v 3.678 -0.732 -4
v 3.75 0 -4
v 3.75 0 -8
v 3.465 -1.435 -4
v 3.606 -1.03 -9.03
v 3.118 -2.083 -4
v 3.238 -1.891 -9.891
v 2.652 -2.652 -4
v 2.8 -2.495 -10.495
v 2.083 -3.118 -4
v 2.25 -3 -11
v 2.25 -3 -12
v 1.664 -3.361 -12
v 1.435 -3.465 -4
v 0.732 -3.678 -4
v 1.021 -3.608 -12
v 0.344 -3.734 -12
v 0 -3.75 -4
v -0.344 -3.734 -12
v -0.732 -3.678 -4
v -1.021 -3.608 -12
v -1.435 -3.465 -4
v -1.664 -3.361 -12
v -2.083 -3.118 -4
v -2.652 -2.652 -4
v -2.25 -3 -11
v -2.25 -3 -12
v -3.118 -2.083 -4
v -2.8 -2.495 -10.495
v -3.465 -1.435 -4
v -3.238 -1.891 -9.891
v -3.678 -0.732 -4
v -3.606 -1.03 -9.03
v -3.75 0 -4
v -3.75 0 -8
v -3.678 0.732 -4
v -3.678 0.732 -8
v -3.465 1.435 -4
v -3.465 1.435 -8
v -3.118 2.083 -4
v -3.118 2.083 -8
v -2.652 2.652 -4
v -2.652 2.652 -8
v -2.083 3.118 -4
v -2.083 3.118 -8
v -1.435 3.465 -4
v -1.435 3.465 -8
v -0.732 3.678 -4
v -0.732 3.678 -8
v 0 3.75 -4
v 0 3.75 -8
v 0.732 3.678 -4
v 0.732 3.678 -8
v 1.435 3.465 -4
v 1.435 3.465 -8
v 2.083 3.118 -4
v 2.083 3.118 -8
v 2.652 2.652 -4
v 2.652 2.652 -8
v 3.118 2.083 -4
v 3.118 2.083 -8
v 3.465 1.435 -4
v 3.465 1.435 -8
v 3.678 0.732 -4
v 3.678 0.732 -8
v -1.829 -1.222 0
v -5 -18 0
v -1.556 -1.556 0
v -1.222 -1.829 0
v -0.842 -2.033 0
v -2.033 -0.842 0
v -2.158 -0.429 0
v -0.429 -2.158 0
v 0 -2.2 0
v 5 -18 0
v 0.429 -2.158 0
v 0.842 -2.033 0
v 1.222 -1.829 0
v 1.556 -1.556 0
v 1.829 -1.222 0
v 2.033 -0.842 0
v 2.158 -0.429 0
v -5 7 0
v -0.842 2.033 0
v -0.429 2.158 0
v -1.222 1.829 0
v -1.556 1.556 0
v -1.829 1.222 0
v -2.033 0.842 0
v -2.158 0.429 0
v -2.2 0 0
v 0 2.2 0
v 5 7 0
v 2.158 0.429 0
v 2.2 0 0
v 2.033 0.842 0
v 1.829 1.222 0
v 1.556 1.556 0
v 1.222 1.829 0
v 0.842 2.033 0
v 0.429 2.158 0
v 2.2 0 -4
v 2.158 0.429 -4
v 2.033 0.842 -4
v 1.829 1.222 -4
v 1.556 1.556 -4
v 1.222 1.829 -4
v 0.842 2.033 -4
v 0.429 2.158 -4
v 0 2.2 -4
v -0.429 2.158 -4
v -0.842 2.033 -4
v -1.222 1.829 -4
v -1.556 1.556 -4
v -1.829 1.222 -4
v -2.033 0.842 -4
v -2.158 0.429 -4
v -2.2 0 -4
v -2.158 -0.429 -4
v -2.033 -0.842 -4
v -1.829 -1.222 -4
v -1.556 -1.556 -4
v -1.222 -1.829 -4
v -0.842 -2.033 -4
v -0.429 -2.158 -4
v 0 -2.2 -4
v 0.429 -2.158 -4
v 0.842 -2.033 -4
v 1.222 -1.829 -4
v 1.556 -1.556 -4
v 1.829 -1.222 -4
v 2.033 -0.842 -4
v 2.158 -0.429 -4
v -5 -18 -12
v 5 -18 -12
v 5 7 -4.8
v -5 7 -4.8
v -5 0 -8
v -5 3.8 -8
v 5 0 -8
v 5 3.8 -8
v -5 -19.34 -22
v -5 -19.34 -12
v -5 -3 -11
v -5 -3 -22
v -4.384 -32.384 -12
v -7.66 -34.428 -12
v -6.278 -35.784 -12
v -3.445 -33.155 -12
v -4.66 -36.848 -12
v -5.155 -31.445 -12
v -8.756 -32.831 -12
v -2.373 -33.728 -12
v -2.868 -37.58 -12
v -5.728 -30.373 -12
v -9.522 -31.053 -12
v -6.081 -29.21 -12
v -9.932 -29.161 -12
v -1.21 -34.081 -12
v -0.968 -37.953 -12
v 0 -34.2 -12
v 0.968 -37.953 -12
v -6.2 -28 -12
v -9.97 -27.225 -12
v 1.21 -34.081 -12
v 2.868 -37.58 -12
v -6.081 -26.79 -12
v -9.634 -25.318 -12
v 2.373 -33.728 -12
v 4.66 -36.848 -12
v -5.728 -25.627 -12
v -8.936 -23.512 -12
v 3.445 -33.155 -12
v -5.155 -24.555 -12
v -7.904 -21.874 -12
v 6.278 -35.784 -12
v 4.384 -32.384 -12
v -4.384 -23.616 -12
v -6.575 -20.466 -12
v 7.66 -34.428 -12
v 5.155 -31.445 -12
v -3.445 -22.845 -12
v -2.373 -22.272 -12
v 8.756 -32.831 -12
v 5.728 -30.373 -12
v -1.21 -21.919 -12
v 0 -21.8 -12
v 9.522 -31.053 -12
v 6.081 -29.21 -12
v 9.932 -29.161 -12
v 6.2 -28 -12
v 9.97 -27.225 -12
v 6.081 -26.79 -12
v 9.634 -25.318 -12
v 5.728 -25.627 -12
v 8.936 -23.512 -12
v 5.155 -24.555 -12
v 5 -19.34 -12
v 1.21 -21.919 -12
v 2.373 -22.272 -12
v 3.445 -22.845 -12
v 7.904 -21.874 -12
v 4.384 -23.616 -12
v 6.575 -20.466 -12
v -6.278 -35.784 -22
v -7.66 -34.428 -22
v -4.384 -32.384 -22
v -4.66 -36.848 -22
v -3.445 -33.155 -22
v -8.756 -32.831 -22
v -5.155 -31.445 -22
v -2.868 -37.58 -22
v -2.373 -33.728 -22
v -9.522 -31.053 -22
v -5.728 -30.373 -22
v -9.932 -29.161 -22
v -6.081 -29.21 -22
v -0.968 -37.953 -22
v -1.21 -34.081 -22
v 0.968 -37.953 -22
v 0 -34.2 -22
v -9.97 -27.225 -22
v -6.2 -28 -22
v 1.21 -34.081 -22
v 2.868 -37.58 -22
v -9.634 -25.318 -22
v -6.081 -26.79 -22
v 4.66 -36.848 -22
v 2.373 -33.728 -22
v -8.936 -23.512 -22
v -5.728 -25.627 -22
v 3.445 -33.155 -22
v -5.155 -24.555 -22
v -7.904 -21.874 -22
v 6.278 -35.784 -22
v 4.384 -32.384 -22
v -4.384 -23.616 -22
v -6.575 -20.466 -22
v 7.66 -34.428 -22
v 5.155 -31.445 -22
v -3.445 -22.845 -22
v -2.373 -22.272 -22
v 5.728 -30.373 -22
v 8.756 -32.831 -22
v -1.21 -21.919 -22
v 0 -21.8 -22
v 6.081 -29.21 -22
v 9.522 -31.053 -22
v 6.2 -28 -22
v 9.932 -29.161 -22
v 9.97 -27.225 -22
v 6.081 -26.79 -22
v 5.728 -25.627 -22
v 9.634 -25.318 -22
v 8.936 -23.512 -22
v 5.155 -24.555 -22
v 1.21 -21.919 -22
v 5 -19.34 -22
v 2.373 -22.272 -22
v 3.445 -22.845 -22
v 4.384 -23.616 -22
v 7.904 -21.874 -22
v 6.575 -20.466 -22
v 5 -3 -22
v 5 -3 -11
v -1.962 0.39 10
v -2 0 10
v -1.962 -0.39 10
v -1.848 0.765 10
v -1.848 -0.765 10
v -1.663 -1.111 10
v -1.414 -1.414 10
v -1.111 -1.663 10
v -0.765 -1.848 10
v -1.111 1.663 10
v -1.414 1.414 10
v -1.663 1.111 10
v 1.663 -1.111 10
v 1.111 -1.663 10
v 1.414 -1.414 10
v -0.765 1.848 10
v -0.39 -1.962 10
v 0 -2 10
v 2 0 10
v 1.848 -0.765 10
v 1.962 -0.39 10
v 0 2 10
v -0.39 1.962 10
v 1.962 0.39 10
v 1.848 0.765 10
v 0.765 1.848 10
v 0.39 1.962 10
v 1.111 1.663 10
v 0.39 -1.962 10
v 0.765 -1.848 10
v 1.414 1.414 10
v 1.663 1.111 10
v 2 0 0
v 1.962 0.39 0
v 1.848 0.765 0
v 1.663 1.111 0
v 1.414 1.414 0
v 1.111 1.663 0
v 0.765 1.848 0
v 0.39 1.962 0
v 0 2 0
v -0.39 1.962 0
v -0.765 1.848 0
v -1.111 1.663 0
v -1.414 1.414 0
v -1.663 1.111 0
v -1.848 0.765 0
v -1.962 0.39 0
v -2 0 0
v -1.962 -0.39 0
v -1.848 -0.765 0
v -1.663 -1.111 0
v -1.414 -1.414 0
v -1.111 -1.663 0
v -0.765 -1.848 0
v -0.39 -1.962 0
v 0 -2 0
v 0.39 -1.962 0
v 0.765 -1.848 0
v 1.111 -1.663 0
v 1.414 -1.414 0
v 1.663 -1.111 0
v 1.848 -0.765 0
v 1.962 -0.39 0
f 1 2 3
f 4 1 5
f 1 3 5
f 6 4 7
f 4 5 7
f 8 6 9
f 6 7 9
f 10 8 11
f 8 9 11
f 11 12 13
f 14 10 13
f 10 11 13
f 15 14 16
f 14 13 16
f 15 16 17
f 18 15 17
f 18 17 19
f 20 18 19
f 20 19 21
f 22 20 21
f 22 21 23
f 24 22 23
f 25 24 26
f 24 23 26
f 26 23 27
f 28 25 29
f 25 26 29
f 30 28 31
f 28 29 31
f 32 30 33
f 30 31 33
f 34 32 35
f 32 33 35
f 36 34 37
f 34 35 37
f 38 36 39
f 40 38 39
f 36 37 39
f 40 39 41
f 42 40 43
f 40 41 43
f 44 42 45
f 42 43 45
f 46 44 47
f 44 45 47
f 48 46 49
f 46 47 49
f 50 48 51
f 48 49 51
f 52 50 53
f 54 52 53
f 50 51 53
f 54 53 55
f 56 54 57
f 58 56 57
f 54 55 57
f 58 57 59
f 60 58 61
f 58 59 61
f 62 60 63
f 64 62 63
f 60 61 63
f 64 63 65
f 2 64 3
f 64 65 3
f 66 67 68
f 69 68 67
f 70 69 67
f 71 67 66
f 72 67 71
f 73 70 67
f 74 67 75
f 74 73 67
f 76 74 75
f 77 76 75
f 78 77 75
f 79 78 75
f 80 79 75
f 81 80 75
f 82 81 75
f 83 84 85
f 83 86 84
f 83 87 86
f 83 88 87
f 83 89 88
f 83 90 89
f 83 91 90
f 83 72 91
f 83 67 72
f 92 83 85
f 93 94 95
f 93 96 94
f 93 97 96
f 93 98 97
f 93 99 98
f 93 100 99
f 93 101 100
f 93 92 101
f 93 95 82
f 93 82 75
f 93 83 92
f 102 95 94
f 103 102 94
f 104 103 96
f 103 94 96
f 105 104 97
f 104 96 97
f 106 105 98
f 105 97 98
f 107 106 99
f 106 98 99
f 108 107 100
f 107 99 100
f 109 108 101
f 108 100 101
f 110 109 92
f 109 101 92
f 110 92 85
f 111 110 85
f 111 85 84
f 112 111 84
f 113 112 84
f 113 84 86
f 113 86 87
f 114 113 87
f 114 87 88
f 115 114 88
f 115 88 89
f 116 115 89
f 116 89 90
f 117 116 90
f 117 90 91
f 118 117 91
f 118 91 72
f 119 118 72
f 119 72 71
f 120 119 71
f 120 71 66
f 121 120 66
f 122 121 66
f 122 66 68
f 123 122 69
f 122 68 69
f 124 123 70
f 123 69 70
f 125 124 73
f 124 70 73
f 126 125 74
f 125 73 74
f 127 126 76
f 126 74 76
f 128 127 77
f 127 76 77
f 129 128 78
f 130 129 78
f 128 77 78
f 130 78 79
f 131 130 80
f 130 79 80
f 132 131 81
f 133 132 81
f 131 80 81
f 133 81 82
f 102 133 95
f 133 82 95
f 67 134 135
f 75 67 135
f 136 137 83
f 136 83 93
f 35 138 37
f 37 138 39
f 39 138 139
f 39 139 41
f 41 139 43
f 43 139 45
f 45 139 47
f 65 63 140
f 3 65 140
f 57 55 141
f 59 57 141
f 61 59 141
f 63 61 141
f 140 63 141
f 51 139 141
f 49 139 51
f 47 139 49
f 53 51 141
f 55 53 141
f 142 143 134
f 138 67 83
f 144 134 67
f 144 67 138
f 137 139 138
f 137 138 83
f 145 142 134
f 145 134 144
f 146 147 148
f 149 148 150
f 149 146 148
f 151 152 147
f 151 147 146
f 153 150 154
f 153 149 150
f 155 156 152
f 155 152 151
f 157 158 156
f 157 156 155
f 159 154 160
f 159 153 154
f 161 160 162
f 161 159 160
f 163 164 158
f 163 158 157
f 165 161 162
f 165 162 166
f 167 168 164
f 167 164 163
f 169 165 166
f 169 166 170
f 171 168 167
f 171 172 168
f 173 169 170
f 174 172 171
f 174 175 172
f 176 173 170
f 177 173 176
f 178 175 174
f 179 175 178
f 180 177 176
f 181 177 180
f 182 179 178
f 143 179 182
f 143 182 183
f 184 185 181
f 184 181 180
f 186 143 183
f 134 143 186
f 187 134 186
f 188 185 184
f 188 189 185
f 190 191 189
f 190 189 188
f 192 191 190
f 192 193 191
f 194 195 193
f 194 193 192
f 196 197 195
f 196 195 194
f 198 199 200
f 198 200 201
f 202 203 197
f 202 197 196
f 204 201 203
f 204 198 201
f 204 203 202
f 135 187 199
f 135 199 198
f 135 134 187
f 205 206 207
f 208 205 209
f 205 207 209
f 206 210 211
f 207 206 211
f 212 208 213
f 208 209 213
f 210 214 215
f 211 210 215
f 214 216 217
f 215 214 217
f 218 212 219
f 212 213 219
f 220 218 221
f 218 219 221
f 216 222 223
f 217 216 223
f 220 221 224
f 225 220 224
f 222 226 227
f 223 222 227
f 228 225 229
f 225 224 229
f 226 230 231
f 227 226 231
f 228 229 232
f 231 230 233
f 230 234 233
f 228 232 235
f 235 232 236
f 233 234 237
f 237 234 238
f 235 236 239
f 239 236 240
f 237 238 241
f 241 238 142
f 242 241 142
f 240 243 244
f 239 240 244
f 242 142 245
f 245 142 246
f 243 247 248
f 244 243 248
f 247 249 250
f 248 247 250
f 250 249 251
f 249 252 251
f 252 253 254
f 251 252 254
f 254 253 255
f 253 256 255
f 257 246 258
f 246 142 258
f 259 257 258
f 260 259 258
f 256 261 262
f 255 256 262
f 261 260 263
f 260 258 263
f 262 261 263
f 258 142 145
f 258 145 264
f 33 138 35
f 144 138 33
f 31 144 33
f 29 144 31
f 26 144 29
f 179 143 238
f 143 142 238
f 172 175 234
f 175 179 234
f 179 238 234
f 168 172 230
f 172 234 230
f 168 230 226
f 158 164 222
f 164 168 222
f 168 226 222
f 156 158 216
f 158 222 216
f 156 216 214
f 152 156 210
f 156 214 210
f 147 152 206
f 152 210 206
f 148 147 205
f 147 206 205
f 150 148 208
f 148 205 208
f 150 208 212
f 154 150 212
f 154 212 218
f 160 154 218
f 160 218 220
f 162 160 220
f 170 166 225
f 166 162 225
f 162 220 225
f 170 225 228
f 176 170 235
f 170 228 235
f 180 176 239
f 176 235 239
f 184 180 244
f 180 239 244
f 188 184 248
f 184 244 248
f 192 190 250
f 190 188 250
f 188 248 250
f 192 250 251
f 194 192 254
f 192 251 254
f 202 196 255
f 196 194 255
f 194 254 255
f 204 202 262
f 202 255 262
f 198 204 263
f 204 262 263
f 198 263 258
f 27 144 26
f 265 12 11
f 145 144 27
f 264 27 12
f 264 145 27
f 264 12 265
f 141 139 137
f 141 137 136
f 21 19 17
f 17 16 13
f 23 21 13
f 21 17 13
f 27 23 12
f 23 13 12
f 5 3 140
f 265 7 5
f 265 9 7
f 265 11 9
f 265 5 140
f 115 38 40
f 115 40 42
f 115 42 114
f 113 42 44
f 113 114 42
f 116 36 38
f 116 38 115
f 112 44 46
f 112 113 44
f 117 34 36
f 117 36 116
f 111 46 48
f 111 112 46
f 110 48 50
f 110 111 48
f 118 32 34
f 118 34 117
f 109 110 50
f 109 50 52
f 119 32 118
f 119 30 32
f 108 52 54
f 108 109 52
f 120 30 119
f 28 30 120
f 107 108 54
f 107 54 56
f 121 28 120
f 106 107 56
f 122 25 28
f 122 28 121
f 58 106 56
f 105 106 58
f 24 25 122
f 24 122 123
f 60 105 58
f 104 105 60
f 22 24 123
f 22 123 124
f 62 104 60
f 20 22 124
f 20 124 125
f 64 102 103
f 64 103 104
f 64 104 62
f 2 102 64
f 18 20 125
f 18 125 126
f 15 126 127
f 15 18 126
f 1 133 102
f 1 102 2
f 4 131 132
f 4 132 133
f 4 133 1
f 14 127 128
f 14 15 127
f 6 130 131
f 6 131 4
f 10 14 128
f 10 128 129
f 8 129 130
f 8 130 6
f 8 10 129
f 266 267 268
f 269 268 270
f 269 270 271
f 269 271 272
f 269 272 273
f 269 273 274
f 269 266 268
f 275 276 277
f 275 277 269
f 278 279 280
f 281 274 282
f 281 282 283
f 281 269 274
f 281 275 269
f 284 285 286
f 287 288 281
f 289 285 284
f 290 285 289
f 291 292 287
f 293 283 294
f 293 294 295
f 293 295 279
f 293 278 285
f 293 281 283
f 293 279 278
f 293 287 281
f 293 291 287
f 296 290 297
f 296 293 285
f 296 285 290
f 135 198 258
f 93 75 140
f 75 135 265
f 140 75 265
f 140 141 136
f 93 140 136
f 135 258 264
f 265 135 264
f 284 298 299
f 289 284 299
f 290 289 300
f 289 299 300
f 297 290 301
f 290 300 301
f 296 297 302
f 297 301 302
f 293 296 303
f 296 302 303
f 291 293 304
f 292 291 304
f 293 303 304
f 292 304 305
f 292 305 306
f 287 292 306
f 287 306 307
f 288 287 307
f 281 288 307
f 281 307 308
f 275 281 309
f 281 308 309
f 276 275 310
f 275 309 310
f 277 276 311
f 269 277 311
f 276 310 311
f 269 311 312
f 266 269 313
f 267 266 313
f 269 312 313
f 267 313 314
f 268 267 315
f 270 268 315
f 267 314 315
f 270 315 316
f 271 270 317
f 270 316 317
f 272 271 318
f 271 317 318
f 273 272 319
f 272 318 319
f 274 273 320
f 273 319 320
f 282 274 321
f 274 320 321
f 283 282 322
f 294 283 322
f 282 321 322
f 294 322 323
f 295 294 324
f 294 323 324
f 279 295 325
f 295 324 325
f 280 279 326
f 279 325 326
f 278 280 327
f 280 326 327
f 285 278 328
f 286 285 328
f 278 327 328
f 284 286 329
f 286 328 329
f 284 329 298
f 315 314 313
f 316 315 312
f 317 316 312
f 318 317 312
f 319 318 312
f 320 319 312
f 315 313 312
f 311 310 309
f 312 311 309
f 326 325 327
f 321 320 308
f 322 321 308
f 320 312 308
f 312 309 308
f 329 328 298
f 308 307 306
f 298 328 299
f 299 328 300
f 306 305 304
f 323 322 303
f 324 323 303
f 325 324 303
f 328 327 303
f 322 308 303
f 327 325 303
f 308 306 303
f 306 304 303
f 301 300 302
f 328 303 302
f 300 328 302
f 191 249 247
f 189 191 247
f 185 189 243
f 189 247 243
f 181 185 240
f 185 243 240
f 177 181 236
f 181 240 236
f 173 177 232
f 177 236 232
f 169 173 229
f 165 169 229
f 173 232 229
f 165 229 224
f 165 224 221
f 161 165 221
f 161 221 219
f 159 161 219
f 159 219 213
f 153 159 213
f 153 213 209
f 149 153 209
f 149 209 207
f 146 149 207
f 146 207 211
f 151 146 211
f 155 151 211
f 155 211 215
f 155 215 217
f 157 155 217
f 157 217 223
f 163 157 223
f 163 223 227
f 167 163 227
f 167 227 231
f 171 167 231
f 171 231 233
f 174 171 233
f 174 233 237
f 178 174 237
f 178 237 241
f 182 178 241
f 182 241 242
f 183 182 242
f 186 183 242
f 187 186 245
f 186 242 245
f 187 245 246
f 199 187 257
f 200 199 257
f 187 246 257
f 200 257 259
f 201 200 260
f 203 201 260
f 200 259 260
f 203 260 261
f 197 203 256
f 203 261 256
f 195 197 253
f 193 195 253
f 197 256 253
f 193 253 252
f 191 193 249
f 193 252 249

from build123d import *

# Parameters (mm, degrees)
CYLINDER_R        = 2
CYLINDER_DEPTH    = 10
BOX001_W          = 10
BOX001_H          = 16
BOX001_DEPTH      = 10
BOX002_W          = 10
BOX002_H          = 15
BOX002_DEPTH      = 22
BOX_W             = 10
BOX_H             = 10
BOX_DEPTH         = 8
CYLINDER001_R     = 10
CYLINDER001_DEPTH = 10
SKETCH_R          = 2.2
POCKET_DEPTH      = 14
SKETCH001_R       = 3.75
POCKET001_DEPTH   = 4
CHAMFER_SIZE      = 3.2
CHAMFER001_SIZE   = 3
SKETCH002_R       = 6.2
POCKET002_DEPTH   = 14


with BuildPart() as cylinder:
    # Cylinder → Cylinder (new body)
    with BuildSketch(Plane.XY):
        Circle(CYLINDER_R)
    extrude(amount=CYLINDER_DEPTH)


with BuildPart() as box001:
    # Box001 → Box001 (new body)
    with BuildSketch(Plane(origin=(-5, -20, -22), x_dir=(1, 0, 0), z_dir=(0, 0, 1))):
        with Locations((5, 8)):
            Rectangle(BOX001_W, BOX001_H)
    extrude(amount=BOX001_DEPTH)


with BuildPart() as box002:
    # Box002 → Box002 (new body)
    with BuildSketch(Plane(origin=(-5, -18, -22), x_dir=(1, 0, 0), z_dir=(0, 0, 1))):
        with Locations((5, 7.5)):
            Rectangle(BOX002_W, BOX002_H)
    extrude(amount=BOX002_DEPTH)


with BuildPart() as box:
    # Box → Box (new body)
    with BuildSketch(Plane(origin=(-5, -3, -8), x_dir=(1, 0, 0), z_dir=(0, 0, 1))):
        with Locations((5, 5)):
            Rectangle(BOX_W, BOX_H)
    extrude(amount=BOX_DEPTH)


with BuildPart() as pocket002:
    # Cylinder001 → Cylinder001 (new body)
    with BuildSketch(Plane(origin=(0, -28, -22), x_dir=(1, 0, 0), z_dir=(0, 0, 1))):
        Circle(CYLINDER001_R)
    extrude(amount=CYLINDER001_DEPTH)

    # Fusion: union Box001, Box002, Box
    add(box001.part)
    add(box002.part)
    add(box.part)

    # Sketch → Pocket (cut)
    with BuildSketch(Plane.XY):
        Circle(SKETCH_R)
    extrude(amount=-POCKET_DEPTH, mode=Mode.SUBTRACT)

    # Sketch001 → Pocket001 (cut, symmetric)
    with BuildSketch(Plane(origin=(0, 0, -8), x_dir=(1, 0, 0), z_dir=(0, 0, -1))):
        Circle(SKETCH001_R)
    extrude(amount=POCKET001_DEPTH, both=True, mode=Mode.SUBTRACT)

    # Chamfer
    chamfer_edges = [pocket002.edges().sort_by_distance(p)[0] for p in [
        (0, 7, -8),
    ]]
    chamfer(chamfer_edges, length=CHAMFER_SIZE)

    # Chamfer001
    chamfer001_edges = [pocket002.edges().sort_by_distance(p)[0] for p in [
        (-3.625, -3, -8),
        (3.625, -3, -8),
    ]]
    chamfer(chamfer001_edges, length=CHAMFER001_SIZE)

    # Sketch002 → Pocket002 (cut)
    with BuildSketch(Plane(origin=(0, 0, -22), x_dir=(1, 0, 0), z_dir=(0, 0, -1))):
        with Locations((0, 28)):
            Circle(SKETCH002_R)
    extrude(amount=-POCKET002_DEPTH, mode=Mode.SUBTRACT)


solid = Compound([cylinder.part, pocket002.part])
